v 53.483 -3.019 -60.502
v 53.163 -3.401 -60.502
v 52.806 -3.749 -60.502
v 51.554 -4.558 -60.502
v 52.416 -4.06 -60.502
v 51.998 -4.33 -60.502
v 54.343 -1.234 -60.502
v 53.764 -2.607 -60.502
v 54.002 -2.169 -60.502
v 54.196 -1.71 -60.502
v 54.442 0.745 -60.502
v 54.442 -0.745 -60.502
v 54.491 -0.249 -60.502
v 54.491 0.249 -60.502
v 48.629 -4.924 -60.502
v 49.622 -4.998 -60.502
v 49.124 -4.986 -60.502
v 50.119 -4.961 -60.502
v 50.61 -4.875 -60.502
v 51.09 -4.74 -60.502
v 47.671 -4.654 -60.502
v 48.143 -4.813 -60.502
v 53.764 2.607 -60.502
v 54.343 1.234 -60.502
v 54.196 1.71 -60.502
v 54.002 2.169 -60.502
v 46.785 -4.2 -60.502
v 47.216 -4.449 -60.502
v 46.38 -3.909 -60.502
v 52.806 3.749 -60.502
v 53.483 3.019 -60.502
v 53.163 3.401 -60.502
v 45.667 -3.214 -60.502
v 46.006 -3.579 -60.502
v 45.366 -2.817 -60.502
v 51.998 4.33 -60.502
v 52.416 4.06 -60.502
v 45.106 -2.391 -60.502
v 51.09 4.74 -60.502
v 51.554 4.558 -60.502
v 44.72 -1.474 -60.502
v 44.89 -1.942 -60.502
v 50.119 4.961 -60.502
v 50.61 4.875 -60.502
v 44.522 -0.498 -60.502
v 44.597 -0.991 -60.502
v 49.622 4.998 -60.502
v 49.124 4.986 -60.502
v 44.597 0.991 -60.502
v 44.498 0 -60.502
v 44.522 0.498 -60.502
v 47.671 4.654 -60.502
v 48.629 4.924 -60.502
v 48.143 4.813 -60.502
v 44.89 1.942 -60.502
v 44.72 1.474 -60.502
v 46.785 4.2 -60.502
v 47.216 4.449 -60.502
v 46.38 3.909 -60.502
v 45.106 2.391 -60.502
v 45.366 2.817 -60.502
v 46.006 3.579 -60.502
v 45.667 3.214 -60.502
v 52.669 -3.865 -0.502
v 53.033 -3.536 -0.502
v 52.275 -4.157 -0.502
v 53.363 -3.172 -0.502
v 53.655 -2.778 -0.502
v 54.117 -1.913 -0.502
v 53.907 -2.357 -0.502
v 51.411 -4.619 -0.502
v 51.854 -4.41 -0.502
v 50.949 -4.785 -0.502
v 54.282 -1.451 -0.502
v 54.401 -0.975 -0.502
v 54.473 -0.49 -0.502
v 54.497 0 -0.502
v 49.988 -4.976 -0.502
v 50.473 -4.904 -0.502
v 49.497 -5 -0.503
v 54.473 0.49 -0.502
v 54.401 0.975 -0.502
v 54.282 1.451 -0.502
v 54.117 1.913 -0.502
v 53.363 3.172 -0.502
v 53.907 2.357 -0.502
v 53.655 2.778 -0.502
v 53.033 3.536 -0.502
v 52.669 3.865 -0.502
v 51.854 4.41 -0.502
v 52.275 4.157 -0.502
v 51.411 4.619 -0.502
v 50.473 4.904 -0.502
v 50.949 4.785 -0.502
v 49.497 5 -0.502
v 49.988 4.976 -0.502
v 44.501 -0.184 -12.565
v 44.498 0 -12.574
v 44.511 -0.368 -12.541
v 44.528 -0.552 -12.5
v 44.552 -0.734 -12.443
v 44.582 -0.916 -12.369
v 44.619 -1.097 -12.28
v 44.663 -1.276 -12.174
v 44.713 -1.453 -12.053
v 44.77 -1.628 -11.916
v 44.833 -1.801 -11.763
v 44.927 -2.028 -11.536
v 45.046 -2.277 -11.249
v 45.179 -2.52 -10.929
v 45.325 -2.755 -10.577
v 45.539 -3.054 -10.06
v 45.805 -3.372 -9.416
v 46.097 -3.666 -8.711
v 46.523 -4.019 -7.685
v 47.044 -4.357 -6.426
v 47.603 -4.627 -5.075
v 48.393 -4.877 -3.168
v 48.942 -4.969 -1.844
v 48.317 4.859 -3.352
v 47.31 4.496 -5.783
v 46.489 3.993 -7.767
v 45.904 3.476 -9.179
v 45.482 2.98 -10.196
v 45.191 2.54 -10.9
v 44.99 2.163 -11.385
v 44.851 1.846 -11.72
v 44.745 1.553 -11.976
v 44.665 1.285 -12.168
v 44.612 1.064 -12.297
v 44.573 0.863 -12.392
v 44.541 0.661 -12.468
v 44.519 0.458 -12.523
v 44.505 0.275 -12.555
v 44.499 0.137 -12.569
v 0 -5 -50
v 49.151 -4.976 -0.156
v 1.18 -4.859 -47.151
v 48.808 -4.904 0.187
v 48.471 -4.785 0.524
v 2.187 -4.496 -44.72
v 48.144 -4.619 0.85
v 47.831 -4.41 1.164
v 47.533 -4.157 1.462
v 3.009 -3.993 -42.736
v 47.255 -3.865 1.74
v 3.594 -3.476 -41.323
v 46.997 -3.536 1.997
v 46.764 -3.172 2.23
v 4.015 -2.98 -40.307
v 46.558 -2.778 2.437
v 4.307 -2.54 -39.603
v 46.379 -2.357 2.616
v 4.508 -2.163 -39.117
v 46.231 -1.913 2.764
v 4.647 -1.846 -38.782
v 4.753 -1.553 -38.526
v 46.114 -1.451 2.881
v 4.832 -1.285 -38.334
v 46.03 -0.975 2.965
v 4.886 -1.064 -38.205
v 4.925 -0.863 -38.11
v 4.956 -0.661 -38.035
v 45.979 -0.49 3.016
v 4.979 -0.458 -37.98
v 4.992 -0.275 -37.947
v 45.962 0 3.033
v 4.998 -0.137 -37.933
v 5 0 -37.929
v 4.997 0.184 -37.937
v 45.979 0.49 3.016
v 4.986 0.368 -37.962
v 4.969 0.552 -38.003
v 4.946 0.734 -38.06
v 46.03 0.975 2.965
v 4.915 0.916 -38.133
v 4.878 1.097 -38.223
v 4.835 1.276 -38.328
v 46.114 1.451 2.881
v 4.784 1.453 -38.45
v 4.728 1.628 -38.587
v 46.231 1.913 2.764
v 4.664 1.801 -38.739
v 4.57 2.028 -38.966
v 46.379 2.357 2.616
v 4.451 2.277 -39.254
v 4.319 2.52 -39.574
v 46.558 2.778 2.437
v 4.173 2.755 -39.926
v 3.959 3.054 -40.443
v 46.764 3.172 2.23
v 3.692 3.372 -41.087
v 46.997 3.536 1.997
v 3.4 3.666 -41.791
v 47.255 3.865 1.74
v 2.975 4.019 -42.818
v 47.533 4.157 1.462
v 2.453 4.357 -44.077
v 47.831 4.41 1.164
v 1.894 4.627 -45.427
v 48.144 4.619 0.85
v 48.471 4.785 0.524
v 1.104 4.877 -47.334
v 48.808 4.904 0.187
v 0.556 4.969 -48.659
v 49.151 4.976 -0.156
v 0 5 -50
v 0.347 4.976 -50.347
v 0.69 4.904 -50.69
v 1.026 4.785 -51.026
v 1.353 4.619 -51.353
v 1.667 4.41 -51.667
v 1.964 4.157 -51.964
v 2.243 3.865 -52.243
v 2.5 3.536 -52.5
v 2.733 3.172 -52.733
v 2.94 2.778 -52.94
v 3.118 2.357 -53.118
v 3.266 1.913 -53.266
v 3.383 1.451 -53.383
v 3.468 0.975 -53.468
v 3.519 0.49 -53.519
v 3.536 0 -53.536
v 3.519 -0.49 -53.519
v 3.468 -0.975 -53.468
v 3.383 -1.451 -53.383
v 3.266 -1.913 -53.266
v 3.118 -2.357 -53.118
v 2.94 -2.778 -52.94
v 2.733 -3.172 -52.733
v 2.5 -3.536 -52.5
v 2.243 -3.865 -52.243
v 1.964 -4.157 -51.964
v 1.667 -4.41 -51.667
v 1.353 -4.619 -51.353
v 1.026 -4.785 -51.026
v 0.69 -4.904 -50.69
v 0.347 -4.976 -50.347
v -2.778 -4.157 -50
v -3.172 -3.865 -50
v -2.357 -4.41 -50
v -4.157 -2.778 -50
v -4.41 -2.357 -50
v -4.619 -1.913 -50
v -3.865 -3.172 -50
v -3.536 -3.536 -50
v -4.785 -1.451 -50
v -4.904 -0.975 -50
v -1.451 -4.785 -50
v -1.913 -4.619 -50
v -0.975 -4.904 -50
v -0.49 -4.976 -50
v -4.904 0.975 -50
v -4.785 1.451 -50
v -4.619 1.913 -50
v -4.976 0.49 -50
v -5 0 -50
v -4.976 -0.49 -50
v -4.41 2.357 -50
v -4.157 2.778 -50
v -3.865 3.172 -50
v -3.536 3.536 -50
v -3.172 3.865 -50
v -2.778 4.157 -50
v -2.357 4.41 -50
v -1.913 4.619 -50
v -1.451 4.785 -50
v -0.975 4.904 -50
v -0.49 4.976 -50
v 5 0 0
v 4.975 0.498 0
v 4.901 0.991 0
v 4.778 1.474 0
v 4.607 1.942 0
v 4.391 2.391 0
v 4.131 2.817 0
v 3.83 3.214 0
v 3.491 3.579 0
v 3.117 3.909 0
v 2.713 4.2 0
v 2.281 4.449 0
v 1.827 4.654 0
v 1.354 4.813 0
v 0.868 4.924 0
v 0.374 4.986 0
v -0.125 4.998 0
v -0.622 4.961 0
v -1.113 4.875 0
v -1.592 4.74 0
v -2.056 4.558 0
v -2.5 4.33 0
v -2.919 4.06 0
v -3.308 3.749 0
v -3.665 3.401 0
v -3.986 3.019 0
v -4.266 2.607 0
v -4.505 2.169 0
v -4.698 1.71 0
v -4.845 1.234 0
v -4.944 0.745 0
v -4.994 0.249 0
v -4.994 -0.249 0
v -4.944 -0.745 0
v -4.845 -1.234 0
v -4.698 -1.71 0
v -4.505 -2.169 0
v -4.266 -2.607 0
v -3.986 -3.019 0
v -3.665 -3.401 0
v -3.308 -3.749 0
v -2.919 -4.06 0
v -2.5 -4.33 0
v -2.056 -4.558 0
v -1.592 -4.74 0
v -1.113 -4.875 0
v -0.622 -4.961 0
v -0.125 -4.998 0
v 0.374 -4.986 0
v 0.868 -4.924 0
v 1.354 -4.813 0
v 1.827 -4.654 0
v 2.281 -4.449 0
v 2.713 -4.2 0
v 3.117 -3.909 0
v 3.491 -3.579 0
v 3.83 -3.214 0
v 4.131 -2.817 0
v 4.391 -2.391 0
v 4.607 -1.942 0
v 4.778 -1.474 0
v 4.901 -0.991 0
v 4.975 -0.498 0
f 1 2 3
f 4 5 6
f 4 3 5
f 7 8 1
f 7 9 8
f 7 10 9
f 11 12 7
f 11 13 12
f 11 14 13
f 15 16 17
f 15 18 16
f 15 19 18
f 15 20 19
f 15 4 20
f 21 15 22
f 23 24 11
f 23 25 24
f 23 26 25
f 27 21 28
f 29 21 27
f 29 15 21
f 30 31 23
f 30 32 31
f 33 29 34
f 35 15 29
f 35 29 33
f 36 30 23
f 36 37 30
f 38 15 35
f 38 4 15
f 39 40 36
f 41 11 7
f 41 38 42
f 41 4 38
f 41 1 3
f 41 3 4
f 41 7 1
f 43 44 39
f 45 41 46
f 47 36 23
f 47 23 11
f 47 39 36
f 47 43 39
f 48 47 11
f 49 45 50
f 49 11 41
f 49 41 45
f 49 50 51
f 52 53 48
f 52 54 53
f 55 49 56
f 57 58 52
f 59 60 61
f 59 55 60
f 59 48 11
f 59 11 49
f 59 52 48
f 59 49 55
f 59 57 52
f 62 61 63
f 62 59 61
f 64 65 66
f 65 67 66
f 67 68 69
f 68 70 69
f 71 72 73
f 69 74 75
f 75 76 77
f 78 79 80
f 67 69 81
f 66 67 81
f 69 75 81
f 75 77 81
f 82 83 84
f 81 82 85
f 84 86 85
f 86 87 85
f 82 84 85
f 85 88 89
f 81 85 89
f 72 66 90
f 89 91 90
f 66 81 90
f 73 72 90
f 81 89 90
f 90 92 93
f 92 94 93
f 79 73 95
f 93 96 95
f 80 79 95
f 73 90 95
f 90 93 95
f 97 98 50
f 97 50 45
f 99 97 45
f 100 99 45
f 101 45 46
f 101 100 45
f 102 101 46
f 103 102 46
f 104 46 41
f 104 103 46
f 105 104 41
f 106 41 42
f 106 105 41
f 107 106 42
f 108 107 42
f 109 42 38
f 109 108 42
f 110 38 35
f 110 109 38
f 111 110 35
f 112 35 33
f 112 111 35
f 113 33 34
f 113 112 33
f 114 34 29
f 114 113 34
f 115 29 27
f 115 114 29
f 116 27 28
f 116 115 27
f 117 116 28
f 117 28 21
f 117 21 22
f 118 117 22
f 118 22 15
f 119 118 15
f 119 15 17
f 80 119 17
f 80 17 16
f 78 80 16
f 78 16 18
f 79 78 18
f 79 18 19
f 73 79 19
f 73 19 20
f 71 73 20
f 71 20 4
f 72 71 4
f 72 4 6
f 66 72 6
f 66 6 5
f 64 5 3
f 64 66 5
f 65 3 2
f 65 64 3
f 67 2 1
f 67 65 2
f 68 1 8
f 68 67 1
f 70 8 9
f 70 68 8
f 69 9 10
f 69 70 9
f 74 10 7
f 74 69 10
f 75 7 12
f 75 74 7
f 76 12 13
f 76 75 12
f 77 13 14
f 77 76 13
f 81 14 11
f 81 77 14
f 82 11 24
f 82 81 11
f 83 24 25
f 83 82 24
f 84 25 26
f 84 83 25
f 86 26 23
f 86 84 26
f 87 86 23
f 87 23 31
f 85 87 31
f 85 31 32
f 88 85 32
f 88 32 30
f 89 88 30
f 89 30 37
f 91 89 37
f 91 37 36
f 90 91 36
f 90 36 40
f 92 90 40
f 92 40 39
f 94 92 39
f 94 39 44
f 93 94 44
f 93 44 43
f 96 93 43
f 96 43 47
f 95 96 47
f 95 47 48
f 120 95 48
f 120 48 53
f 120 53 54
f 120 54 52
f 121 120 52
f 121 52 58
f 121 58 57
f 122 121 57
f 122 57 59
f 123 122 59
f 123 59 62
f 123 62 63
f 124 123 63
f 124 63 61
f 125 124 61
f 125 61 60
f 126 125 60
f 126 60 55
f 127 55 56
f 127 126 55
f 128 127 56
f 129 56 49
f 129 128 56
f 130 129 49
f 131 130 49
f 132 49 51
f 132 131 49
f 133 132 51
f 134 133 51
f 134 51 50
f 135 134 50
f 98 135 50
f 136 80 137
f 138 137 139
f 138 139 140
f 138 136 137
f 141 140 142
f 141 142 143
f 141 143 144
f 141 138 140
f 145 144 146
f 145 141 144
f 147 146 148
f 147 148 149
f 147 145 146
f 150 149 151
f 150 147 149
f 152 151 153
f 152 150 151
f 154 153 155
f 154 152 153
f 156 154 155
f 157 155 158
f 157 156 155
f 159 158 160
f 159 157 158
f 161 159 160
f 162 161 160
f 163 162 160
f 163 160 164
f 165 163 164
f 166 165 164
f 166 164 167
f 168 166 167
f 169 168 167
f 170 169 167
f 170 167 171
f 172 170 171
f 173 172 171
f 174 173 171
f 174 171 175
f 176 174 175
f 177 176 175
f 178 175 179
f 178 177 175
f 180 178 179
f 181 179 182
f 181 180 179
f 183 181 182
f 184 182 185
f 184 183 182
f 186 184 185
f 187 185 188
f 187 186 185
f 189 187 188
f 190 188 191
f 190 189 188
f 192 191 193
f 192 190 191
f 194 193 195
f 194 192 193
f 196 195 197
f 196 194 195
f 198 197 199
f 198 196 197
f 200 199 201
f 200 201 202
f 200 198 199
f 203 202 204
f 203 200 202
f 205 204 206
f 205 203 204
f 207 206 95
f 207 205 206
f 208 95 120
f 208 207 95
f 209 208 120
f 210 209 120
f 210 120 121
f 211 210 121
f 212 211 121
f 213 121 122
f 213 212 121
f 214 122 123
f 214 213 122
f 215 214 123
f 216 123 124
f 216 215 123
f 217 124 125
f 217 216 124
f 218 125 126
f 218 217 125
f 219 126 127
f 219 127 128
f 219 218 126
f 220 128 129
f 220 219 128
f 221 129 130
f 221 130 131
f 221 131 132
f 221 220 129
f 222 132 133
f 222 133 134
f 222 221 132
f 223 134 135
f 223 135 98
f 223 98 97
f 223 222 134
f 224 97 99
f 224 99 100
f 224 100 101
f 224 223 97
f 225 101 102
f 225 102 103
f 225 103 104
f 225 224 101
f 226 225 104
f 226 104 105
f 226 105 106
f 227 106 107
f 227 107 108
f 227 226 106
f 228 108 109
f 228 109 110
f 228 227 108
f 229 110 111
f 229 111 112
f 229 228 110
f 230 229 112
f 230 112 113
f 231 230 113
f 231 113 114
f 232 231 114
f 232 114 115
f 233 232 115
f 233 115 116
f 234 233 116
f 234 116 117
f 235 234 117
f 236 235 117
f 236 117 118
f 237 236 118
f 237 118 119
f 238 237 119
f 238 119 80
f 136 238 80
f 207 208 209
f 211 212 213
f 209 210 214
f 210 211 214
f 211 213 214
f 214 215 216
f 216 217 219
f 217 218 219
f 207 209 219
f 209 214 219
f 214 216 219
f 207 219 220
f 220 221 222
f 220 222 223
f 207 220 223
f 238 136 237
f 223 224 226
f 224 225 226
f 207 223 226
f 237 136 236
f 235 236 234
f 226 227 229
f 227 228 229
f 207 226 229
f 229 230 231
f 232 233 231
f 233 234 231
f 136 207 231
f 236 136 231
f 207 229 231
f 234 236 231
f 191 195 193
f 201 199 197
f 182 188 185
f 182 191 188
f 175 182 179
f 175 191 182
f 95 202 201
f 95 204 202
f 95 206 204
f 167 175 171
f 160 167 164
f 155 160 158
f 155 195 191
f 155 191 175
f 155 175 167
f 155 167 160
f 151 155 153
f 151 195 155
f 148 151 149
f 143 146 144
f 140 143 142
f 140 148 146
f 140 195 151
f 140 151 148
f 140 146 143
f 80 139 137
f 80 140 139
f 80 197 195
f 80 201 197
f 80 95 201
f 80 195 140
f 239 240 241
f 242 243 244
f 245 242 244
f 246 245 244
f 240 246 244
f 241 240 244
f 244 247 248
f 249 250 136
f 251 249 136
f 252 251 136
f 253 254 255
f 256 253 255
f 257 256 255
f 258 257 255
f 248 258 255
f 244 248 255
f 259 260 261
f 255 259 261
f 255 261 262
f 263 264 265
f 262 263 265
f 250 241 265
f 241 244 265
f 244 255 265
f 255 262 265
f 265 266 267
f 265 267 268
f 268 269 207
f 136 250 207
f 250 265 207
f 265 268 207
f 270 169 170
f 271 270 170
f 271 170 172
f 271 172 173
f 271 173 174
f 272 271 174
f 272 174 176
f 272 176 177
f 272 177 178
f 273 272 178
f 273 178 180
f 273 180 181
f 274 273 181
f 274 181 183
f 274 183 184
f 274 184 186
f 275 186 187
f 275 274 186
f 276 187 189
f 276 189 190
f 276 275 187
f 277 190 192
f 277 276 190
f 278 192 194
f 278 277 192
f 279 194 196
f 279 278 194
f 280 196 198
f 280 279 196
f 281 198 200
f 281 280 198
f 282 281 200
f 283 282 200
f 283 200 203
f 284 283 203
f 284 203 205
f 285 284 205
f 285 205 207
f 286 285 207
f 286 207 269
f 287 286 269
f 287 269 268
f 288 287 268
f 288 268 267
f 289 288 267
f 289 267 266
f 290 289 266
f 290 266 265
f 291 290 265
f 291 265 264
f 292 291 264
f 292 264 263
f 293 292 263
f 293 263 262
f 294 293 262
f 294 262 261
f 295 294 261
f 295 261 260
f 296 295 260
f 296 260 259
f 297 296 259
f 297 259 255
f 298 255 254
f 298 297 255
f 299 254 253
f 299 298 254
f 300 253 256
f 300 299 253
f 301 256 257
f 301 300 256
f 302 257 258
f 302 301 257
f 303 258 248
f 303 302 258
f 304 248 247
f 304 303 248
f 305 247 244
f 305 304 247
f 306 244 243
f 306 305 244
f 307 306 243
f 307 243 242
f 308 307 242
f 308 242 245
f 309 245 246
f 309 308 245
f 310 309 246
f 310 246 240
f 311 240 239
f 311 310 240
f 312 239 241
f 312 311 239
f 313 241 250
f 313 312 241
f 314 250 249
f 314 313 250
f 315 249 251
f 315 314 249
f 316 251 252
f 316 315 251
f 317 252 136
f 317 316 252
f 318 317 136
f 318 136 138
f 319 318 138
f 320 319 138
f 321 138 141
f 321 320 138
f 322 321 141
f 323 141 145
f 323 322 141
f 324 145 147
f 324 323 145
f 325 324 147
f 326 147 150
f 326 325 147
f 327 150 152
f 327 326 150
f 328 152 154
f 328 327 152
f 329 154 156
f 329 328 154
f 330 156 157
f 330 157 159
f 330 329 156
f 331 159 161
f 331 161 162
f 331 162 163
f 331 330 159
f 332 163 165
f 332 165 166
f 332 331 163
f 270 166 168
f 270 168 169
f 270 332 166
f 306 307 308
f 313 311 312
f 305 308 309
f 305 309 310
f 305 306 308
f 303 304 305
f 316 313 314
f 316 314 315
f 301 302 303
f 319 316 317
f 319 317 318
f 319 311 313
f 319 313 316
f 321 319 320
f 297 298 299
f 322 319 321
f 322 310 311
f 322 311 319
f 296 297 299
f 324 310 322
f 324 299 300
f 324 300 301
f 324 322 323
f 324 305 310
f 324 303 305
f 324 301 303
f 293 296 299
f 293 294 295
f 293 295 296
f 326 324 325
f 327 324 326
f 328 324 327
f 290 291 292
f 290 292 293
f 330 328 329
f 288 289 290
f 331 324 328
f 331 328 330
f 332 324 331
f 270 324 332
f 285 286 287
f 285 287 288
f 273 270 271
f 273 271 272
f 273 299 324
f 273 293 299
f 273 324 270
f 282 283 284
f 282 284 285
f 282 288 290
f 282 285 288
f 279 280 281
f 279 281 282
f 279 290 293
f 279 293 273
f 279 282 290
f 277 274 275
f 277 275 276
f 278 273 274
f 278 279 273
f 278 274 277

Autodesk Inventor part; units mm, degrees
ref_plane "XZ Plane" through (0, 0, 0) normal (0, 1, 0) x (-1, 0, 0)
ref_plane "XY Plane" through (0, 0, 0) normal (0, 0, 1) x (1, 0, 0)
sketch "Sketch1" plane through (0, 0, 0) normal (0, 0, 1) x (1, 0, 0)
  circle A0 centre (0, 0) radius 5
  dimension "d0" = 10
extrude "Extrusion1" add sketch "Sketch1" against normal blind 50
ref_plane "Work Plane1" through (0, 0, -50) normal (0, 0, -1) x (-1, 0, 0)
ref_plane "Work Plane3" through (0, 0, -50) normal (0.7071068, 0, 0.7071068) x (0, -1, 0)
ref_plane "Work Plane2" through (0, 0, -50) normal (1, 0, 0) x (0, 1, 0)
sketch "Sketch2" plane through (0, 0, -50) normal (0.7071068, 0, 0.7071068) x (0, -1, 0)
  ellipse E0 centre (0, 0) end of major axis (-5, 0) minor radius 3.5355 projected
  circle A0 centre (0, 0) radius 5
  point P0 (0, -35.3553)
  dimension "d14" = 10
extrude "Extrusion2" add sketch "Sketch2" along normal blind 70
ref_plane "Work Plane4" through (49.4975, 0, -0.5025) normal (0, 0, -1) x (-1, 0, 0)
sketch "Sketch3" plane through (49.4975, 0, -0.5025) normal (0, 0, -1) x (-1, 0, 0)
  ellipse E0 centre (0, 0) end of major axis (0, 5) minor radius 3.5355 projected
  circle A0 centre (0, 0) radius 5
  point P0 (49.4975, 0)
extrude "Extrusion3" add sketch "Sketch3" along normal blind 60
ref_plane "Work Plane5" through (0, 0, -50) normal (0.3826834, 0, 0.9238795) x (0, -1, 0)
sketch "Sketch4" plane through (0, 0, -50) normal (0.3826834, 0, 0.9238795) x (0, -1, 0)
  circle A0 centre (0, 0) radius 2.8545
  point P0 (0, -19.1342)
extrude "Extrusion4" add sketch "Sketch4" along normal blind 1
ref_plane "Work Plane8" through (49.4975, 0, -0.5025) normal (0.3826834, 0, 0.9238795) x (0, 1, 0)
sketch "Sketch5" plane through (49.4975, 0, -0.5025) normal (0.3826834, 0, 0.9238795) x (0, 1, 0)
  circle A0 centre (0, 0) radius 2.6859
  point P0 (0, 45.922)
extrude "Extrusion5" add sketch "Sketch5" against normal blind 1
ref_plane "Work Plane7" through (49.4975, 0, -35.0025) normal (0, 0, -1) x (-1, 0, 0)
sketch "Sketch6" plane through (49.4975, 0, -35.0025) normal (0, 0, -1) x (-1, 0, 0)
  ellipse E0 centre (0, 0) end of major axis (0, -2.6859) minor radius 2.4814 projected
  line L0 (-2.1727, -1.2973) -> (2.1727, -1.2973)
  line L1 (2.1727, -1.2973) -> (2.1727, 1.2973)
  line L2 (2.1727, 1.2973) -> (-2.1727, 1.2973)
  line L3 (-2.1727, 1.2973) -> (-2.1727, -1.2973)
  line L4 (0, -5) -> (0, 5) projected
  line L5 (-2.1727, -1.2973) -> (2.1727, 1.2973) construction
  line L6 (2.1727, -1.2973) -> (-2.1727, 1.2973) construction
  point P0 (49.4975, 0)
  point P1 (0, 0)
extrude "Extrusion6" add sketch "Sketch6" along normal blind 1 contours L0 L4 L2 L1 | L3 L2 L4 L0
properties part number "00_Beam_Ocular_Detectoin"
